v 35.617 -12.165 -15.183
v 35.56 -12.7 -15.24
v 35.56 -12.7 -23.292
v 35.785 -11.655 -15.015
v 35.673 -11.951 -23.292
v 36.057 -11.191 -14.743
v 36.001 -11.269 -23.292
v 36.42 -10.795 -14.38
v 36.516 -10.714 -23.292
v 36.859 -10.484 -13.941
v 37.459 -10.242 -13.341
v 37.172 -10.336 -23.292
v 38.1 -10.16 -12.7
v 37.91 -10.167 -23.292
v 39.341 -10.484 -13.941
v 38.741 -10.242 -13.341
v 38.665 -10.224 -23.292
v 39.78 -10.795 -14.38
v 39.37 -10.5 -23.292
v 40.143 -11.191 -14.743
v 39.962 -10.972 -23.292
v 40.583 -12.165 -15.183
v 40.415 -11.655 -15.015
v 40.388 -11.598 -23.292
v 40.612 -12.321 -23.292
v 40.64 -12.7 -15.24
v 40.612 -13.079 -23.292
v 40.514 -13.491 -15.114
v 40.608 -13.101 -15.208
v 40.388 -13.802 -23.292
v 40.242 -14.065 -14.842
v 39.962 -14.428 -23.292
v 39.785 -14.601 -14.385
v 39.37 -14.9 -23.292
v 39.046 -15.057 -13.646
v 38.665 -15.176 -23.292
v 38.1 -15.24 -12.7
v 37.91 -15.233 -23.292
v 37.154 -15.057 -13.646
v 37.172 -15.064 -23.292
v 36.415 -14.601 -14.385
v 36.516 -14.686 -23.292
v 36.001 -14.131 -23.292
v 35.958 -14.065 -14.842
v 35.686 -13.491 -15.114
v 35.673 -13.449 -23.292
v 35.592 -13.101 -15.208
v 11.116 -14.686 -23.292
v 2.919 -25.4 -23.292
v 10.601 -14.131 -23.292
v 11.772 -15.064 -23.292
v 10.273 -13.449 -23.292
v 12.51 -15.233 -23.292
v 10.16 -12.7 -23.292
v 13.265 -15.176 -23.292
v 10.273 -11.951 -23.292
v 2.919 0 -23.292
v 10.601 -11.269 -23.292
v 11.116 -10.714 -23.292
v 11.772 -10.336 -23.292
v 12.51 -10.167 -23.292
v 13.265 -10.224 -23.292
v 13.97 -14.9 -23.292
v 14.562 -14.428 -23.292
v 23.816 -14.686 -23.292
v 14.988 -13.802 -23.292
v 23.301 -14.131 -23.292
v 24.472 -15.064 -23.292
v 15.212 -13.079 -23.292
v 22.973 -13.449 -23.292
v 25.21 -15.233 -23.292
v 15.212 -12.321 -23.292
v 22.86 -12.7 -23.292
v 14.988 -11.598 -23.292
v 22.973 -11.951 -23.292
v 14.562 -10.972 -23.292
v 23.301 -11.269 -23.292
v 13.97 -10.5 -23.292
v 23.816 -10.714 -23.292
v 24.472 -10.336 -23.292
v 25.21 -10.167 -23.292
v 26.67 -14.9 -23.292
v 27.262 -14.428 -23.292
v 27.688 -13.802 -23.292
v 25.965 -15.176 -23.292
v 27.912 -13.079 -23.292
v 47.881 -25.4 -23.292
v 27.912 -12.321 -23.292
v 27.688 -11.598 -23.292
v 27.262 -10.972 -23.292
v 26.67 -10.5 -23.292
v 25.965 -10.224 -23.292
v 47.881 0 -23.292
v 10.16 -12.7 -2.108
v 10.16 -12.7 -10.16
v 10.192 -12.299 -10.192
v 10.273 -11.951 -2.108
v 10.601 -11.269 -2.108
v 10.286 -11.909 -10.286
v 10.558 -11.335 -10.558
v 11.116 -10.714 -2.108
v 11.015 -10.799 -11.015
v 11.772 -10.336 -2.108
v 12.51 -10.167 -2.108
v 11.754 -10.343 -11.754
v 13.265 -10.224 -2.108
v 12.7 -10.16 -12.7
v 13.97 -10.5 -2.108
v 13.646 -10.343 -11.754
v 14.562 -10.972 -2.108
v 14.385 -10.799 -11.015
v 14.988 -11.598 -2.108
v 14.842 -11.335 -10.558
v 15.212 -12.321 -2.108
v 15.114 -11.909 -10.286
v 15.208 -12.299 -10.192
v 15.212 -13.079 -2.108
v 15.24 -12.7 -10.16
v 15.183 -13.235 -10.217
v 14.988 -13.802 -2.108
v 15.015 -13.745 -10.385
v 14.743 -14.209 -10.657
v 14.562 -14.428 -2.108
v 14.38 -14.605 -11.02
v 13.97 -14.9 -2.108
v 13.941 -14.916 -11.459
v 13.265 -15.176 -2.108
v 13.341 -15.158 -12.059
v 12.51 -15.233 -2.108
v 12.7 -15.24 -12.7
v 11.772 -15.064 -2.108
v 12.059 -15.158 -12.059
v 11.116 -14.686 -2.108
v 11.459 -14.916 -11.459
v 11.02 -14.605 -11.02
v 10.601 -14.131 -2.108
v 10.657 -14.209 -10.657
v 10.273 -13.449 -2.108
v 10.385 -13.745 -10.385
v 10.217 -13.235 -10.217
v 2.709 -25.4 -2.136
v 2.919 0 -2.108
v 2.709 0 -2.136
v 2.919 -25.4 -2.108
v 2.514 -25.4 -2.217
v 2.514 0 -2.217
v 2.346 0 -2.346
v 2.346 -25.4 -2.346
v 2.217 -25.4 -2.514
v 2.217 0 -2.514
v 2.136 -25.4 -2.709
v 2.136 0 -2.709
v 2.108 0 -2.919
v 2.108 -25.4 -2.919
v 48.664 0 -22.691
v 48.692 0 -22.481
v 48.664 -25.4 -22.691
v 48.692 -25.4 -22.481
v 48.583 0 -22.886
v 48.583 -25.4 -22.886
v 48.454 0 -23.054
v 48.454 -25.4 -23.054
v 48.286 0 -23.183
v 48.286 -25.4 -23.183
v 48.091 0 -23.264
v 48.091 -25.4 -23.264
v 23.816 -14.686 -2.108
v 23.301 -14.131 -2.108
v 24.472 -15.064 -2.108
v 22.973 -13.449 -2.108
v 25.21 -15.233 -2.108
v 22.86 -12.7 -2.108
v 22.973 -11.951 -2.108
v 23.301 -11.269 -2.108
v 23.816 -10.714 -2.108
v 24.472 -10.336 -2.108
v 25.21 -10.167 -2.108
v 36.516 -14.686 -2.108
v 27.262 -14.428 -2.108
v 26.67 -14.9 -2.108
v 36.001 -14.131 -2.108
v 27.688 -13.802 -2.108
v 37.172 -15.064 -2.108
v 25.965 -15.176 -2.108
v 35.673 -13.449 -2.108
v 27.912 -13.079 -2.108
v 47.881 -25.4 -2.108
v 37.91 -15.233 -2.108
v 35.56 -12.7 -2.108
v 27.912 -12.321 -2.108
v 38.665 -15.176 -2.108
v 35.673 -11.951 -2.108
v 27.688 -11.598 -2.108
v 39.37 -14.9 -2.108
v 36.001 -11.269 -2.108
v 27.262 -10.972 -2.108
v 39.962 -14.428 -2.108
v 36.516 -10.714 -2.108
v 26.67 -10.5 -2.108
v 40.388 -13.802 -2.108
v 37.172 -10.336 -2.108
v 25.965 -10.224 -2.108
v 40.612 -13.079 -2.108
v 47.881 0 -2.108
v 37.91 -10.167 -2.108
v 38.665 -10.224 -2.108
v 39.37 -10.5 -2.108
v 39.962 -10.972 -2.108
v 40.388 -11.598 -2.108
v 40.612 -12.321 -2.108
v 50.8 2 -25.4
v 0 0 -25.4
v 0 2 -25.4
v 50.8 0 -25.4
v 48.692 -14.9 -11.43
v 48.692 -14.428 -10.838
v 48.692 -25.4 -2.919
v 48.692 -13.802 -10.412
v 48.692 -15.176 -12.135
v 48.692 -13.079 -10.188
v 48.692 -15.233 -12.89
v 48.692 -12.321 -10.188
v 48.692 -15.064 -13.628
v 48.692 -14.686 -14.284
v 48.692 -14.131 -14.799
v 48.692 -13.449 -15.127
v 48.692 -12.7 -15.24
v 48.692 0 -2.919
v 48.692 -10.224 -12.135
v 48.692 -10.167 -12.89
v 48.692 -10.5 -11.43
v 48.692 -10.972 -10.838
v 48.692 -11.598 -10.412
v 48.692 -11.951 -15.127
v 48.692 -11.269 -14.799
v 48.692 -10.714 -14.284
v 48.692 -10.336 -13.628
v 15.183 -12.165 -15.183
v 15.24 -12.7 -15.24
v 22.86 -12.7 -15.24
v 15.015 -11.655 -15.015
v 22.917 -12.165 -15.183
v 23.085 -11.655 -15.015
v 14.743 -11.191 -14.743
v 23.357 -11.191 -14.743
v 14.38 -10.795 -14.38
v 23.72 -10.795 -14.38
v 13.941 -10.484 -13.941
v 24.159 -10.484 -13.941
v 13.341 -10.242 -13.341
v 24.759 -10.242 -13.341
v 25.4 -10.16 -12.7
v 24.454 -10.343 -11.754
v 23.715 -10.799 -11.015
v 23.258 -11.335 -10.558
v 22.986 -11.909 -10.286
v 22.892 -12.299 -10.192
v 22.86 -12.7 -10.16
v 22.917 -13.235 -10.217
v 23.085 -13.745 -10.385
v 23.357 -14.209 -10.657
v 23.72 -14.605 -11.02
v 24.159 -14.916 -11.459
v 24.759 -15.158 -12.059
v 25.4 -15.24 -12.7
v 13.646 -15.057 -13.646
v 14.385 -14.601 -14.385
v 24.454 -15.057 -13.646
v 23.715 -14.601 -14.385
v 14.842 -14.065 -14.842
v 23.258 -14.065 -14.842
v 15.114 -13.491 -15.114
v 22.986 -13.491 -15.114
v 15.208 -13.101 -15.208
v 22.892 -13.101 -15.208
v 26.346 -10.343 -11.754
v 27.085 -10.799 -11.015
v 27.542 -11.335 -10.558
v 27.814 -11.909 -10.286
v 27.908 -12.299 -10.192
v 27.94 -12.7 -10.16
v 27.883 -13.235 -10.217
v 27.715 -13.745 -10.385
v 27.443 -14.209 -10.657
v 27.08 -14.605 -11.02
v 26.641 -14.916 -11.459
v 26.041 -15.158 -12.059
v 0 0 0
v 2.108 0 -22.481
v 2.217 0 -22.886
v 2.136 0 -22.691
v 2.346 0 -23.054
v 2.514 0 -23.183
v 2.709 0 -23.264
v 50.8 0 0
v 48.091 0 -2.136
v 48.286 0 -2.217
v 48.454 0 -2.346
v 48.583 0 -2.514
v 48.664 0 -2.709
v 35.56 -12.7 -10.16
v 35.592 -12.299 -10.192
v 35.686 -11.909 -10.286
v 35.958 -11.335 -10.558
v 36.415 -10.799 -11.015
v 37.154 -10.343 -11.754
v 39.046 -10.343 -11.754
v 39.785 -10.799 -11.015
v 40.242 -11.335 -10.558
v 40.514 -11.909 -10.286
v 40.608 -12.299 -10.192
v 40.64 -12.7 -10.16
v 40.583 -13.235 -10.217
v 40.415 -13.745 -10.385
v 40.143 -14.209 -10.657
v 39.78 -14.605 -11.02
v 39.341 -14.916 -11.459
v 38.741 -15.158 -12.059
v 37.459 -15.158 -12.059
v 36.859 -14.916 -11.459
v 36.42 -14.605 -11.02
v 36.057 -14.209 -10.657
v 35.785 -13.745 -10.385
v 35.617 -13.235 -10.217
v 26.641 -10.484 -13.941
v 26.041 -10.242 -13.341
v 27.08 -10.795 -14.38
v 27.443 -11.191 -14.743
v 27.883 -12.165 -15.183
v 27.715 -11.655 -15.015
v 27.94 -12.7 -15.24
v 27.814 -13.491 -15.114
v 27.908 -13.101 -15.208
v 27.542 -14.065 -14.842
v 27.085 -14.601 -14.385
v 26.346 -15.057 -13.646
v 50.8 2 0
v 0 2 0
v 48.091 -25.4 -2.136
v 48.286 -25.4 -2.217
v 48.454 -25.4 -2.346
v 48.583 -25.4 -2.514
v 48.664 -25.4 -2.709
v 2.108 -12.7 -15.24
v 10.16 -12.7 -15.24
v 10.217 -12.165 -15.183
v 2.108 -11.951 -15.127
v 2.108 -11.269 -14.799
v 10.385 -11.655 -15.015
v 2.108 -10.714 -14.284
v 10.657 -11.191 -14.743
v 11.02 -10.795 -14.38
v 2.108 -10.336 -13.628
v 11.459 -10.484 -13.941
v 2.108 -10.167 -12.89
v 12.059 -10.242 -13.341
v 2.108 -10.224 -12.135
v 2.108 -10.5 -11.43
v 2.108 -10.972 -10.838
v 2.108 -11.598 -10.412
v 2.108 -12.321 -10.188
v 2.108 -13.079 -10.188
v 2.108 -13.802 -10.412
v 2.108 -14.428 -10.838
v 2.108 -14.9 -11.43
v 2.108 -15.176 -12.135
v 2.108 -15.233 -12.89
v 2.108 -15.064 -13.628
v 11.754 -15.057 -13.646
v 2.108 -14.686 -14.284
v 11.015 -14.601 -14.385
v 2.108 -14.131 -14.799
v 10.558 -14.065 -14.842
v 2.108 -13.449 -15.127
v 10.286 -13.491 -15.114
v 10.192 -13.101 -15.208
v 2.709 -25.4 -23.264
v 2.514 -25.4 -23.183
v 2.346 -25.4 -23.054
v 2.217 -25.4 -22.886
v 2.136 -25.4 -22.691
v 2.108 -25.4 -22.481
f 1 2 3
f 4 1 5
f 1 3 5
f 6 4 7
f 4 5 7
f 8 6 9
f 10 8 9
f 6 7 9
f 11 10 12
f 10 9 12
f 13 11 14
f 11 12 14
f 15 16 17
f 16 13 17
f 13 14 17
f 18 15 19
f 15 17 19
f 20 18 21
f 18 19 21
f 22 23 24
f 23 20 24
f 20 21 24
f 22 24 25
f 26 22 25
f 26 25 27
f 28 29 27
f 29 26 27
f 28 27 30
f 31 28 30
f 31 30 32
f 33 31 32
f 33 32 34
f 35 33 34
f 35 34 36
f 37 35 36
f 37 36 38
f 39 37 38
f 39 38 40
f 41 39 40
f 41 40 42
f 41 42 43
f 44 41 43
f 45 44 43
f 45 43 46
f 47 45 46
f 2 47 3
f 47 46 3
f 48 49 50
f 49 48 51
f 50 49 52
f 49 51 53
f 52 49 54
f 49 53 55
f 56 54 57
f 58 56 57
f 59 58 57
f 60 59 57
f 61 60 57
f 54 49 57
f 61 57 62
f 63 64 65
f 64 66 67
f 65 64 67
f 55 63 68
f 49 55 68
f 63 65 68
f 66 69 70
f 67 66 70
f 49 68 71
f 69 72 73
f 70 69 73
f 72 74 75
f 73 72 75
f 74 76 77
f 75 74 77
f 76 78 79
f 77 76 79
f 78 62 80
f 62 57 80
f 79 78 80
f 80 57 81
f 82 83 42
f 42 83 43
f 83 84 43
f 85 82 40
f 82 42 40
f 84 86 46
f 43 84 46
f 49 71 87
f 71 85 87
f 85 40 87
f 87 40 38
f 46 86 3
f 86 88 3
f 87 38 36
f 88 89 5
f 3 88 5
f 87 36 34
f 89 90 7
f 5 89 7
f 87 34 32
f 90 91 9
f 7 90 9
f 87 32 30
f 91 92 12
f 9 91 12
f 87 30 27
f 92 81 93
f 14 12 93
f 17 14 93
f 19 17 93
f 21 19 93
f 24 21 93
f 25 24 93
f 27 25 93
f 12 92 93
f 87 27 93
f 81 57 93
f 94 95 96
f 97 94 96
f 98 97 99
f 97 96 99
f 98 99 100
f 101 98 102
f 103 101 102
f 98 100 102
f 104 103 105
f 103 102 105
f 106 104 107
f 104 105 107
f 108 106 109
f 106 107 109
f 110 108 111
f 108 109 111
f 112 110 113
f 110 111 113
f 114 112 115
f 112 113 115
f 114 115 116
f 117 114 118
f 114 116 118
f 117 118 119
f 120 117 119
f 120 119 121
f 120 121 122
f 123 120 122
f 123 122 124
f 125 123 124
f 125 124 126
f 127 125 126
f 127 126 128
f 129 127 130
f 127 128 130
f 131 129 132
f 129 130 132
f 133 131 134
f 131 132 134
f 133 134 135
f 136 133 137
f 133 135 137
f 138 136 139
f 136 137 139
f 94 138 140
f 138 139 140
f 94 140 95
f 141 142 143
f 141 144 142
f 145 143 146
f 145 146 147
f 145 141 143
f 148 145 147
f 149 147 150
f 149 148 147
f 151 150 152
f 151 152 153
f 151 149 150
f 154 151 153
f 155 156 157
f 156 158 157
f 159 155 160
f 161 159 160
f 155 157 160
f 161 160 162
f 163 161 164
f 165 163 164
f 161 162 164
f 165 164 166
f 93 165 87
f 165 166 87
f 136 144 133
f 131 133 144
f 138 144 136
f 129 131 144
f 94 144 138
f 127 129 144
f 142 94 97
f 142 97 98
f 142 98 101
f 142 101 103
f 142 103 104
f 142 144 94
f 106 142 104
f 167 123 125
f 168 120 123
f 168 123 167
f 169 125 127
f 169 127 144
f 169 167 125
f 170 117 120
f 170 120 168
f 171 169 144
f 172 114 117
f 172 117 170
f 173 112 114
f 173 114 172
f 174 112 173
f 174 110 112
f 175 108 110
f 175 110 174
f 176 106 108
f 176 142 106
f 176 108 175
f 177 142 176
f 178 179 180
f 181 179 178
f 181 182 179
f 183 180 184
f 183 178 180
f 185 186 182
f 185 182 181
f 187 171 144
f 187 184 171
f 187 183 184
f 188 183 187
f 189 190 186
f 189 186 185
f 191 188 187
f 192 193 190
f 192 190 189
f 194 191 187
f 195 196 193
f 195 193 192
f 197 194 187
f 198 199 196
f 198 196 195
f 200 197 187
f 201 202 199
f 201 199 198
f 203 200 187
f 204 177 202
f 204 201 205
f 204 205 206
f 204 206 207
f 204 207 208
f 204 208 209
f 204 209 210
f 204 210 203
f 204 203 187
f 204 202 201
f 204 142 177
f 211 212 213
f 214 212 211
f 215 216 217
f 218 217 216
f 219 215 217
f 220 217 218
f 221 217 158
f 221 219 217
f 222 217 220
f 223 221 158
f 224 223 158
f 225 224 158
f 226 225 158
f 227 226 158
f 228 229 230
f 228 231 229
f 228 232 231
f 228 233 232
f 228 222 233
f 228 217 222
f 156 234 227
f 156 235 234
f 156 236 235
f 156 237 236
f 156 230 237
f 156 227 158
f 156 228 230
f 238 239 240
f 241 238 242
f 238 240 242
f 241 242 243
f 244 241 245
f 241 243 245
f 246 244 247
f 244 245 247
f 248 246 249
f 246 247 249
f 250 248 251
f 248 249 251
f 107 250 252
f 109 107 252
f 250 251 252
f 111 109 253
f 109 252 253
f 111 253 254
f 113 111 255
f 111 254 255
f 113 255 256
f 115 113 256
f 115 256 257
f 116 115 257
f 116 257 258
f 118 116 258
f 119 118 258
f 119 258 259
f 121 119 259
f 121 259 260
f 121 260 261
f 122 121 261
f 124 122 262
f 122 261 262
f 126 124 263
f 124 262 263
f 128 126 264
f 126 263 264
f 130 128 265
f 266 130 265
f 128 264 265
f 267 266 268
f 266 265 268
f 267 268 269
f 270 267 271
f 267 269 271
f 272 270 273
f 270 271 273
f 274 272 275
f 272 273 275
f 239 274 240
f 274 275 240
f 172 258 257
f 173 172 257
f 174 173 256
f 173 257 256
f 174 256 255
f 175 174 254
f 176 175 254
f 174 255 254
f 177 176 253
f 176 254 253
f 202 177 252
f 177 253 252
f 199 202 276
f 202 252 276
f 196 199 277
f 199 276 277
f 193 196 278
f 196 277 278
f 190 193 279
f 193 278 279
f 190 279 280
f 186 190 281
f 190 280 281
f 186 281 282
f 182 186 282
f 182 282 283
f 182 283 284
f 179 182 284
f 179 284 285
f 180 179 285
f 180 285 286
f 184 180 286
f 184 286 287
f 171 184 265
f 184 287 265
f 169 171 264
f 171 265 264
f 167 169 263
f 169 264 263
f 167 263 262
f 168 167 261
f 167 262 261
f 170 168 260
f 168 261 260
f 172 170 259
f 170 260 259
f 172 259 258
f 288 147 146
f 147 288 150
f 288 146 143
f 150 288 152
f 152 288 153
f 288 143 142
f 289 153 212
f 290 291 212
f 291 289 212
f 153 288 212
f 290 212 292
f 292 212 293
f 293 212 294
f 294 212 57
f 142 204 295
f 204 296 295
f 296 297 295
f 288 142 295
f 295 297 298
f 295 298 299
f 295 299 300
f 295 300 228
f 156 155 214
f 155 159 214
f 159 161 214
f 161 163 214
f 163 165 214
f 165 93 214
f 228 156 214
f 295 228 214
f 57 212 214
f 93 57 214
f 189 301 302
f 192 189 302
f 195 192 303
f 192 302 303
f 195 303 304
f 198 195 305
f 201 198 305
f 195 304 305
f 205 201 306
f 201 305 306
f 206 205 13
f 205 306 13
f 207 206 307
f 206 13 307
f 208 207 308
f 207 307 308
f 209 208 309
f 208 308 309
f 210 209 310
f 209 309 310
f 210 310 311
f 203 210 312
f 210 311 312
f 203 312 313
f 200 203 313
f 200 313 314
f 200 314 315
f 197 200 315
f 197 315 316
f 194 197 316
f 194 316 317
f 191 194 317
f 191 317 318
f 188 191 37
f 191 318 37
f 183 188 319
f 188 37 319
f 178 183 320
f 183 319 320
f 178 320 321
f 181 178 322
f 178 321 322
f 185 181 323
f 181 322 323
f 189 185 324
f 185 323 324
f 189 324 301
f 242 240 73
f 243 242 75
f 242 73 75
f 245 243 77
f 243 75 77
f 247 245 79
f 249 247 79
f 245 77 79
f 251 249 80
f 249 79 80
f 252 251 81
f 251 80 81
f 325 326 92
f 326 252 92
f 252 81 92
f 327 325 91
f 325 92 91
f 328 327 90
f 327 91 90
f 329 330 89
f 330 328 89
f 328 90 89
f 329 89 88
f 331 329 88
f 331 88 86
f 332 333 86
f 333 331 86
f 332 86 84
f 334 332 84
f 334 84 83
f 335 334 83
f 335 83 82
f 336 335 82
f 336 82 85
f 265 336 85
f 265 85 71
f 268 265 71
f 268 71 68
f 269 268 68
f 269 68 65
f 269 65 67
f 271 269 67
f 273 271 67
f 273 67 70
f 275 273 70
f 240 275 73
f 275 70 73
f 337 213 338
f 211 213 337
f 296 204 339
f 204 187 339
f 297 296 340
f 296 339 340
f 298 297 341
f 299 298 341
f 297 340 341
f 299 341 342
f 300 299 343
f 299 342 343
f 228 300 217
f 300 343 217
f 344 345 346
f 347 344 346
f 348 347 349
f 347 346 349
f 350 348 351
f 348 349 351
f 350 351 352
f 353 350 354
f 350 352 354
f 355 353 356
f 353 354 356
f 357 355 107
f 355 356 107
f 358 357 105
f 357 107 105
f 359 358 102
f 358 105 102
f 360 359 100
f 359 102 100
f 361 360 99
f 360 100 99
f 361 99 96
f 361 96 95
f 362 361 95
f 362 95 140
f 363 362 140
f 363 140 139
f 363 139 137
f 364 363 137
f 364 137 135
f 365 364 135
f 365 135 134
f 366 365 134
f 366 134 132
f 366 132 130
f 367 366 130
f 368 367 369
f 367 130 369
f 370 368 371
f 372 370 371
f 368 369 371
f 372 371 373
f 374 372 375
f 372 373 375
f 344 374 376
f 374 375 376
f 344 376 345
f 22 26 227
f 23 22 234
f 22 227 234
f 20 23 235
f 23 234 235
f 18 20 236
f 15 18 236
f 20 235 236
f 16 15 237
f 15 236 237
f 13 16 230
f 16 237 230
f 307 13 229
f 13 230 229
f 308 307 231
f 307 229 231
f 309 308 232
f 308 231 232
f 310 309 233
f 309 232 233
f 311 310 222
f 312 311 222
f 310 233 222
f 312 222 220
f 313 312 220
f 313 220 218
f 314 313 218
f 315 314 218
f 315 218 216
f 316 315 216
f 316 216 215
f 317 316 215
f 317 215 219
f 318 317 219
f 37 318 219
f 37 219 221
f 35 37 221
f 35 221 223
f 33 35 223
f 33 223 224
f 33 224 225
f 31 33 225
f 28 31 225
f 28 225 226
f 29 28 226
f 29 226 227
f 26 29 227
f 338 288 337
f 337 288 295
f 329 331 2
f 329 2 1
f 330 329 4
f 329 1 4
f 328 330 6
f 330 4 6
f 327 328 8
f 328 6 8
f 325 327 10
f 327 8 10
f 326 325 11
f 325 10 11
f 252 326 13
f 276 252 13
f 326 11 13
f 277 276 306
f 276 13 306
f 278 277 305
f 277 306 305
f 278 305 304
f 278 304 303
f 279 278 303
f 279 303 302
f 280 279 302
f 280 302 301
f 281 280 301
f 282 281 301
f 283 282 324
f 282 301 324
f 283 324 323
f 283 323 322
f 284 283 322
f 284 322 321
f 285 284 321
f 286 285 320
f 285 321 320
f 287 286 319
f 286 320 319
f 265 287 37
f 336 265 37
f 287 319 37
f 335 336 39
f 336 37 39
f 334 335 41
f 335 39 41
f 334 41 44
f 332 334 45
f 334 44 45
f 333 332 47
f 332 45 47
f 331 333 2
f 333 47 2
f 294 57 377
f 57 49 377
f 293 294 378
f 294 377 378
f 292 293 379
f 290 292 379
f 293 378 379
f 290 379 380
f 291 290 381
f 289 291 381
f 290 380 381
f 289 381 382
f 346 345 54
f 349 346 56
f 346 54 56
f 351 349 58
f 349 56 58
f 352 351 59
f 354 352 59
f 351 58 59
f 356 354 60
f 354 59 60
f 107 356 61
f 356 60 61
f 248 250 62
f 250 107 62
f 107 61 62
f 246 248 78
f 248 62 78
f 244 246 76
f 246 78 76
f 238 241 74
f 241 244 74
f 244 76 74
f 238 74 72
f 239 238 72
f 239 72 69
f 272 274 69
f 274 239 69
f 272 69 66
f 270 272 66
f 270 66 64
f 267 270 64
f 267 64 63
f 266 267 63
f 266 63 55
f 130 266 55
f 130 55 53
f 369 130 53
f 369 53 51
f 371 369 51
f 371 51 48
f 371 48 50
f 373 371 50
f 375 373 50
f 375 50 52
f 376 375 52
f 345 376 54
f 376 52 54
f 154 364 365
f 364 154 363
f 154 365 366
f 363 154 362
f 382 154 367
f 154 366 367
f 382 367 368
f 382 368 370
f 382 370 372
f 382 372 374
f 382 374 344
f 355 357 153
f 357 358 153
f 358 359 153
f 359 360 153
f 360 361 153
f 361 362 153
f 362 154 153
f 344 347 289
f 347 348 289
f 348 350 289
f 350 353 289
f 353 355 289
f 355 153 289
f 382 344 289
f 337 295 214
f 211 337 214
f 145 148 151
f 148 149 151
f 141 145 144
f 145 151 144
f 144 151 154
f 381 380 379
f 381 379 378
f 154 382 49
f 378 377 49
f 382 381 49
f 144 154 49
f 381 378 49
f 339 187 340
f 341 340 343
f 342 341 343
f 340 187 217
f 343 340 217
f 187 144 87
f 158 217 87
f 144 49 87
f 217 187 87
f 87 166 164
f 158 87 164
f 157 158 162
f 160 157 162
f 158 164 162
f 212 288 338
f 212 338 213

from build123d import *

# Parameters (mm, degrees)
SKETCH2_W           = 50.8
SKETCH2_H           = 25.4
BOSS_EXTRUDE2_DEPTH = 1.999996
SKETCH2_4_W         = 46.5836
SKETCH2_4_H         = 21.1836
BOSS_EXTRUDE3_DEPTH = 25.4
FILLET3_R           = 0.810638298
SKETCH3_R           = 2.54
CUT_EXTRUDE1_DEPTH  = 49.6918
SKETCH4_R           = 2.54
CUT_EXTRUDE2_DEPTH  = 24.2918


with BuildPart() as part:
    # Sketch2 → Boss-Extrude2 (new body)
    with BuildSketch(Plane(origin=(0, 0, 0), x_dir=(1, 0, 0), z_dir=(0, 1, 0))):
        with Locations((25.4, 12.7)):
            Rectangle(SKETCH2_W, SKETCH2_H)
    extrude(amount=BOSS_EXTRUDE2_DEPTH)

    # Sketch2<4> → Boss-Extrude3 (add)
    with BuildSketch(Plane(origin=(0, 0, 0), x_dir=(1, 0, 0), z_dir=(0, 1, 0))):
        with Locations((25.4, 12.7)):
            Rectangle(SKETCH2_4_W, SKETCH2_4_H)
    extrude(amount=-BOSS_EXTRUDE3_DEPTH)

    # Fillet3
    fillet3_edges = [part.edges().sort_by_distance(p)[0] for p in [
        (2.1082, -12.7, -2.1082),
        (2.1082, -12.7, -23.2918),
        (48.6918, -12.7, -23.2918),
        (48.6918, -12.7, -2.1082),
    ]]
    fillet(fillet3_edges, radius=FILLET3_R)

    # Sketch3 → Cut-Extrude1 (cut, through all)
    with BuildSketch(Plane(origin=(48.6918, 0, 0), x_dir=(0, 0, -1), z_dir=(1, 0, 0))):
        with Locations((12.7, -12.7)):
            Circle(SKETCH3_R)
    extrude(amount=-CUT_EXTRUDE1_DEPTH, mode=Mode.SUBTRACT)

    # Sketch4 → Cut-Extrude2 (cut, through all)
    with BuildSketch(Plane(origin=(0, 0, -23.2918), x_dir=(-1, 0, 0), z_dir=(0, 0, -1))):
        with Locations((-25.4, -12.7)):
            Circle(SKETCH4_R)
        with Locations((-38.1, -12.7)):
            Circle(SKETCH4_R)
        with Locations((-12.7, -12.7)):
            Circle(SKETCH4_R)
    extrude(amount=-CUT_EXTRUDE2_DEPTH, mode=Mode.SUBTRACT)


solid = part.part
